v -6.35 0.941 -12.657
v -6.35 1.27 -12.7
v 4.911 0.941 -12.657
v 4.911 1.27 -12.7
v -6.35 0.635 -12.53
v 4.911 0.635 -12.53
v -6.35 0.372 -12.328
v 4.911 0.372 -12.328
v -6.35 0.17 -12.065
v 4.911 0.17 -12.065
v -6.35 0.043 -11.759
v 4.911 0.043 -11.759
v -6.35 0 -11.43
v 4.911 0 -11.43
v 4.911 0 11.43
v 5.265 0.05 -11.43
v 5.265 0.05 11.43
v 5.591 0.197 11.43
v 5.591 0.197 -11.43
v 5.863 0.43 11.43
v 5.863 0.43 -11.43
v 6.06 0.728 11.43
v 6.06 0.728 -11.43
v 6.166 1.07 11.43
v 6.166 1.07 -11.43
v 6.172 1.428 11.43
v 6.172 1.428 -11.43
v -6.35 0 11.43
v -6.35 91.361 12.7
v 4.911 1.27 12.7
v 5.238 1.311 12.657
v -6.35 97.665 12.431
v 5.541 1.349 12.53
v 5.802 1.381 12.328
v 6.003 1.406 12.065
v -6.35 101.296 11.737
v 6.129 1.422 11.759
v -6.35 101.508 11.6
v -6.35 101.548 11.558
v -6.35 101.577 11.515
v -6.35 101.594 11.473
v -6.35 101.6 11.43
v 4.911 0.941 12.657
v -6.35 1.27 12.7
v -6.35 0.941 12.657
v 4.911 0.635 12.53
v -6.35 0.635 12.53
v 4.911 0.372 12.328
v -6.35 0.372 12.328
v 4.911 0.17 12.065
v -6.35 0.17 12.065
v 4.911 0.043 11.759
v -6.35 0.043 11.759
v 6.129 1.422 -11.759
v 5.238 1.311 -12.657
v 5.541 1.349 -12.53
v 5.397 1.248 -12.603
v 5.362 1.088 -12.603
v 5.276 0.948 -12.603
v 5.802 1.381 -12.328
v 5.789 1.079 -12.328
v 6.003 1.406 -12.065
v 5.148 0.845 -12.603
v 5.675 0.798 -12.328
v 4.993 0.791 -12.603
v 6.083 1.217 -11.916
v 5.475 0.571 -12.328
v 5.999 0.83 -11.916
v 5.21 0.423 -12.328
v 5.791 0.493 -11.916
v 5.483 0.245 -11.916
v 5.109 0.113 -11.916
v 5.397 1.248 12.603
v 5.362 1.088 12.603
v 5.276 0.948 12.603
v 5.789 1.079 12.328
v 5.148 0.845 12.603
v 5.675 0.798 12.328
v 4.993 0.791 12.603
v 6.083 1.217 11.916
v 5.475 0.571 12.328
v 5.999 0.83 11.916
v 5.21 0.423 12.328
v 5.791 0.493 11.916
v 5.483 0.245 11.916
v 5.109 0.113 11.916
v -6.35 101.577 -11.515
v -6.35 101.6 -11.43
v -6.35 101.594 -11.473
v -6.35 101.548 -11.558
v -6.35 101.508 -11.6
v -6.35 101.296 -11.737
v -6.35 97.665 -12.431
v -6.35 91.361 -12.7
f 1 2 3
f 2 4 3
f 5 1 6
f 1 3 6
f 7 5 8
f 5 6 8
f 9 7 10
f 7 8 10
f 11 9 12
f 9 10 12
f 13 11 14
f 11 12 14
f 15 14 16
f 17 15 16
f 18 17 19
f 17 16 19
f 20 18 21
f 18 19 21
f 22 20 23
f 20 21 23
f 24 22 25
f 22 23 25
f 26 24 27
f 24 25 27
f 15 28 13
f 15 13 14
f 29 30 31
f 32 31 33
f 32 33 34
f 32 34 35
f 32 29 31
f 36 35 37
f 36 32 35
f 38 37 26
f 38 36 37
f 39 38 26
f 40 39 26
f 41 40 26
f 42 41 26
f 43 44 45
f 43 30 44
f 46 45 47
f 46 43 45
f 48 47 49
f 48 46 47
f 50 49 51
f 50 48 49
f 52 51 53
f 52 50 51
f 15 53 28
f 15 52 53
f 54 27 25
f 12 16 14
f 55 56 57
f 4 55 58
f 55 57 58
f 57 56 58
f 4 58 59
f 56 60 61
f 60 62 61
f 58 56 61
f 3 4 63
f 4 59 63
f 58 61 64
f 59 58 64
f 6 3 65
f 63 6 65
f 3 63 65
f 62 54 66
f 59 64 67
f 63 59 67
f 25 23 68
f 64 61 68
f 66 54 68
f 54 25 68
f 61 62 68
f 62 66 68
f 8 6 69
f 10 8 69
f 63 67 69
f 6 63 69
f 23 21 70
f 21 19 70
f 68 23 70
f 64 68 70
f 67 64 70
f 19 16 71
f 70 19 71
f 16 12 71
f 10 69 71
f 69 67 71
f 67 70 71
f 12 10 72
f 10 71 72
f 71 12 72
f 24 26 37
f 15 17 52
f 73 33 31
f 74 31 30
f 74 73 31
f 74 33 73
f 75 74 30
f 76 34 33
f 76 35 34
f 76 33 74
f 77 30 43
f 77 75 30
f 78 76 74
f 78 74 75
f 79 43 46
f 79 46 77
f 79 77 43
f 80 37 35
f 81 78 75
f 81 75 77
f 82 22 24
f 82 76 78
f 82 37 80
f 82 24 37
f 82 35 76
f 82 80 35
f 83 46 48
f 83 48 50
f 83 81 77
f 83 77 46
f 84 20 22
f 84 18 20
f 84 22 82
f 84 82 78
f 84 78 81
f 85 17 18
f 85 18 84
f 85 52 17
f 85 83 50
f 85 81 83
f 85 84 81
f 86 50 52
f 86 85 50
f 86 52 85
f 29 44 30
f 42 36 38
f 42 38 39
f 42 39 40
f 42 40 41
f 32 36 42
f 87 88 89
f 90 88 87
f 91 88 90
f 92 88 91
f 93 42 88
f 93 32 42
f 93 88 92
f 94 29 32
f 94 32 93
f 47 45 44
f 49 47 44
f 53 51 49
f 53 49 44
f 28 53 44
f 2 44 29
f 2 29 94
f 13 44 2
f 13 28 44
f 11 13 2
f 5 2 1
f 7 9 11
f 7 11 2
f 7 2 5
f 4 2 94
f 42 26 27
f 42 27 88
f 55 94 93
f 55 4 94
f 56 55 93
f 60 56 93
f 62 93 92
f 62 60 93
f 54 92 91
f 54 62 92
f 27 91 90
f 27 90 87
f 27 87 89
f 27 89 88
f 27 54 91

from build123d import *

# Parameters (mm, degrees)
SKETCH1_W           = 12.7
SKETCH1_H           = 25.4
BOSS_EXTRUDE1_DEPTH = 101.6
CUT_EXTRUDE1_DEPTH  = 105.919218926
FILLET1_R           = 1.27


with BuildPart() as part:
    # Sketch1 → Boss-Extrude1 (new body)
    with BuildSketch(Plane(origin=(0, 0, 0), x_dir=(1, 0, 0), z_dir=(0, 1, 0))):
        Rectangle(SKETCH1_W, SKETCH1_H)
    extrude(amount=BOSS_EXTRUDE1_DEPTH)

    # Sketch2 → Cut-Extrude1 (cut, through all)
    with BuildSketch(Plane.XY.offset(12.7)):
        Polygon((6.35, 0), (-6.35, 101.6), (6.35, 101.6), align=None)
    extrude(amount=-CUT_EXTRUDE1_DEPTH, mode=Mode.SUBTRACT)

    # Fillet1
    fillet1_edges = [part.edges().sort_by_distance(p)[0] for p in [
        (0, 50.8, -12.7),
        (0, 50.8, 12.7),
        (0, 0, 12.7),
        (0, 0, -12.7),
        (6.35, 0, 0),
    ]]
    fillet(fillet1_edges, radius=FILLET1_R)


solid = part.part
